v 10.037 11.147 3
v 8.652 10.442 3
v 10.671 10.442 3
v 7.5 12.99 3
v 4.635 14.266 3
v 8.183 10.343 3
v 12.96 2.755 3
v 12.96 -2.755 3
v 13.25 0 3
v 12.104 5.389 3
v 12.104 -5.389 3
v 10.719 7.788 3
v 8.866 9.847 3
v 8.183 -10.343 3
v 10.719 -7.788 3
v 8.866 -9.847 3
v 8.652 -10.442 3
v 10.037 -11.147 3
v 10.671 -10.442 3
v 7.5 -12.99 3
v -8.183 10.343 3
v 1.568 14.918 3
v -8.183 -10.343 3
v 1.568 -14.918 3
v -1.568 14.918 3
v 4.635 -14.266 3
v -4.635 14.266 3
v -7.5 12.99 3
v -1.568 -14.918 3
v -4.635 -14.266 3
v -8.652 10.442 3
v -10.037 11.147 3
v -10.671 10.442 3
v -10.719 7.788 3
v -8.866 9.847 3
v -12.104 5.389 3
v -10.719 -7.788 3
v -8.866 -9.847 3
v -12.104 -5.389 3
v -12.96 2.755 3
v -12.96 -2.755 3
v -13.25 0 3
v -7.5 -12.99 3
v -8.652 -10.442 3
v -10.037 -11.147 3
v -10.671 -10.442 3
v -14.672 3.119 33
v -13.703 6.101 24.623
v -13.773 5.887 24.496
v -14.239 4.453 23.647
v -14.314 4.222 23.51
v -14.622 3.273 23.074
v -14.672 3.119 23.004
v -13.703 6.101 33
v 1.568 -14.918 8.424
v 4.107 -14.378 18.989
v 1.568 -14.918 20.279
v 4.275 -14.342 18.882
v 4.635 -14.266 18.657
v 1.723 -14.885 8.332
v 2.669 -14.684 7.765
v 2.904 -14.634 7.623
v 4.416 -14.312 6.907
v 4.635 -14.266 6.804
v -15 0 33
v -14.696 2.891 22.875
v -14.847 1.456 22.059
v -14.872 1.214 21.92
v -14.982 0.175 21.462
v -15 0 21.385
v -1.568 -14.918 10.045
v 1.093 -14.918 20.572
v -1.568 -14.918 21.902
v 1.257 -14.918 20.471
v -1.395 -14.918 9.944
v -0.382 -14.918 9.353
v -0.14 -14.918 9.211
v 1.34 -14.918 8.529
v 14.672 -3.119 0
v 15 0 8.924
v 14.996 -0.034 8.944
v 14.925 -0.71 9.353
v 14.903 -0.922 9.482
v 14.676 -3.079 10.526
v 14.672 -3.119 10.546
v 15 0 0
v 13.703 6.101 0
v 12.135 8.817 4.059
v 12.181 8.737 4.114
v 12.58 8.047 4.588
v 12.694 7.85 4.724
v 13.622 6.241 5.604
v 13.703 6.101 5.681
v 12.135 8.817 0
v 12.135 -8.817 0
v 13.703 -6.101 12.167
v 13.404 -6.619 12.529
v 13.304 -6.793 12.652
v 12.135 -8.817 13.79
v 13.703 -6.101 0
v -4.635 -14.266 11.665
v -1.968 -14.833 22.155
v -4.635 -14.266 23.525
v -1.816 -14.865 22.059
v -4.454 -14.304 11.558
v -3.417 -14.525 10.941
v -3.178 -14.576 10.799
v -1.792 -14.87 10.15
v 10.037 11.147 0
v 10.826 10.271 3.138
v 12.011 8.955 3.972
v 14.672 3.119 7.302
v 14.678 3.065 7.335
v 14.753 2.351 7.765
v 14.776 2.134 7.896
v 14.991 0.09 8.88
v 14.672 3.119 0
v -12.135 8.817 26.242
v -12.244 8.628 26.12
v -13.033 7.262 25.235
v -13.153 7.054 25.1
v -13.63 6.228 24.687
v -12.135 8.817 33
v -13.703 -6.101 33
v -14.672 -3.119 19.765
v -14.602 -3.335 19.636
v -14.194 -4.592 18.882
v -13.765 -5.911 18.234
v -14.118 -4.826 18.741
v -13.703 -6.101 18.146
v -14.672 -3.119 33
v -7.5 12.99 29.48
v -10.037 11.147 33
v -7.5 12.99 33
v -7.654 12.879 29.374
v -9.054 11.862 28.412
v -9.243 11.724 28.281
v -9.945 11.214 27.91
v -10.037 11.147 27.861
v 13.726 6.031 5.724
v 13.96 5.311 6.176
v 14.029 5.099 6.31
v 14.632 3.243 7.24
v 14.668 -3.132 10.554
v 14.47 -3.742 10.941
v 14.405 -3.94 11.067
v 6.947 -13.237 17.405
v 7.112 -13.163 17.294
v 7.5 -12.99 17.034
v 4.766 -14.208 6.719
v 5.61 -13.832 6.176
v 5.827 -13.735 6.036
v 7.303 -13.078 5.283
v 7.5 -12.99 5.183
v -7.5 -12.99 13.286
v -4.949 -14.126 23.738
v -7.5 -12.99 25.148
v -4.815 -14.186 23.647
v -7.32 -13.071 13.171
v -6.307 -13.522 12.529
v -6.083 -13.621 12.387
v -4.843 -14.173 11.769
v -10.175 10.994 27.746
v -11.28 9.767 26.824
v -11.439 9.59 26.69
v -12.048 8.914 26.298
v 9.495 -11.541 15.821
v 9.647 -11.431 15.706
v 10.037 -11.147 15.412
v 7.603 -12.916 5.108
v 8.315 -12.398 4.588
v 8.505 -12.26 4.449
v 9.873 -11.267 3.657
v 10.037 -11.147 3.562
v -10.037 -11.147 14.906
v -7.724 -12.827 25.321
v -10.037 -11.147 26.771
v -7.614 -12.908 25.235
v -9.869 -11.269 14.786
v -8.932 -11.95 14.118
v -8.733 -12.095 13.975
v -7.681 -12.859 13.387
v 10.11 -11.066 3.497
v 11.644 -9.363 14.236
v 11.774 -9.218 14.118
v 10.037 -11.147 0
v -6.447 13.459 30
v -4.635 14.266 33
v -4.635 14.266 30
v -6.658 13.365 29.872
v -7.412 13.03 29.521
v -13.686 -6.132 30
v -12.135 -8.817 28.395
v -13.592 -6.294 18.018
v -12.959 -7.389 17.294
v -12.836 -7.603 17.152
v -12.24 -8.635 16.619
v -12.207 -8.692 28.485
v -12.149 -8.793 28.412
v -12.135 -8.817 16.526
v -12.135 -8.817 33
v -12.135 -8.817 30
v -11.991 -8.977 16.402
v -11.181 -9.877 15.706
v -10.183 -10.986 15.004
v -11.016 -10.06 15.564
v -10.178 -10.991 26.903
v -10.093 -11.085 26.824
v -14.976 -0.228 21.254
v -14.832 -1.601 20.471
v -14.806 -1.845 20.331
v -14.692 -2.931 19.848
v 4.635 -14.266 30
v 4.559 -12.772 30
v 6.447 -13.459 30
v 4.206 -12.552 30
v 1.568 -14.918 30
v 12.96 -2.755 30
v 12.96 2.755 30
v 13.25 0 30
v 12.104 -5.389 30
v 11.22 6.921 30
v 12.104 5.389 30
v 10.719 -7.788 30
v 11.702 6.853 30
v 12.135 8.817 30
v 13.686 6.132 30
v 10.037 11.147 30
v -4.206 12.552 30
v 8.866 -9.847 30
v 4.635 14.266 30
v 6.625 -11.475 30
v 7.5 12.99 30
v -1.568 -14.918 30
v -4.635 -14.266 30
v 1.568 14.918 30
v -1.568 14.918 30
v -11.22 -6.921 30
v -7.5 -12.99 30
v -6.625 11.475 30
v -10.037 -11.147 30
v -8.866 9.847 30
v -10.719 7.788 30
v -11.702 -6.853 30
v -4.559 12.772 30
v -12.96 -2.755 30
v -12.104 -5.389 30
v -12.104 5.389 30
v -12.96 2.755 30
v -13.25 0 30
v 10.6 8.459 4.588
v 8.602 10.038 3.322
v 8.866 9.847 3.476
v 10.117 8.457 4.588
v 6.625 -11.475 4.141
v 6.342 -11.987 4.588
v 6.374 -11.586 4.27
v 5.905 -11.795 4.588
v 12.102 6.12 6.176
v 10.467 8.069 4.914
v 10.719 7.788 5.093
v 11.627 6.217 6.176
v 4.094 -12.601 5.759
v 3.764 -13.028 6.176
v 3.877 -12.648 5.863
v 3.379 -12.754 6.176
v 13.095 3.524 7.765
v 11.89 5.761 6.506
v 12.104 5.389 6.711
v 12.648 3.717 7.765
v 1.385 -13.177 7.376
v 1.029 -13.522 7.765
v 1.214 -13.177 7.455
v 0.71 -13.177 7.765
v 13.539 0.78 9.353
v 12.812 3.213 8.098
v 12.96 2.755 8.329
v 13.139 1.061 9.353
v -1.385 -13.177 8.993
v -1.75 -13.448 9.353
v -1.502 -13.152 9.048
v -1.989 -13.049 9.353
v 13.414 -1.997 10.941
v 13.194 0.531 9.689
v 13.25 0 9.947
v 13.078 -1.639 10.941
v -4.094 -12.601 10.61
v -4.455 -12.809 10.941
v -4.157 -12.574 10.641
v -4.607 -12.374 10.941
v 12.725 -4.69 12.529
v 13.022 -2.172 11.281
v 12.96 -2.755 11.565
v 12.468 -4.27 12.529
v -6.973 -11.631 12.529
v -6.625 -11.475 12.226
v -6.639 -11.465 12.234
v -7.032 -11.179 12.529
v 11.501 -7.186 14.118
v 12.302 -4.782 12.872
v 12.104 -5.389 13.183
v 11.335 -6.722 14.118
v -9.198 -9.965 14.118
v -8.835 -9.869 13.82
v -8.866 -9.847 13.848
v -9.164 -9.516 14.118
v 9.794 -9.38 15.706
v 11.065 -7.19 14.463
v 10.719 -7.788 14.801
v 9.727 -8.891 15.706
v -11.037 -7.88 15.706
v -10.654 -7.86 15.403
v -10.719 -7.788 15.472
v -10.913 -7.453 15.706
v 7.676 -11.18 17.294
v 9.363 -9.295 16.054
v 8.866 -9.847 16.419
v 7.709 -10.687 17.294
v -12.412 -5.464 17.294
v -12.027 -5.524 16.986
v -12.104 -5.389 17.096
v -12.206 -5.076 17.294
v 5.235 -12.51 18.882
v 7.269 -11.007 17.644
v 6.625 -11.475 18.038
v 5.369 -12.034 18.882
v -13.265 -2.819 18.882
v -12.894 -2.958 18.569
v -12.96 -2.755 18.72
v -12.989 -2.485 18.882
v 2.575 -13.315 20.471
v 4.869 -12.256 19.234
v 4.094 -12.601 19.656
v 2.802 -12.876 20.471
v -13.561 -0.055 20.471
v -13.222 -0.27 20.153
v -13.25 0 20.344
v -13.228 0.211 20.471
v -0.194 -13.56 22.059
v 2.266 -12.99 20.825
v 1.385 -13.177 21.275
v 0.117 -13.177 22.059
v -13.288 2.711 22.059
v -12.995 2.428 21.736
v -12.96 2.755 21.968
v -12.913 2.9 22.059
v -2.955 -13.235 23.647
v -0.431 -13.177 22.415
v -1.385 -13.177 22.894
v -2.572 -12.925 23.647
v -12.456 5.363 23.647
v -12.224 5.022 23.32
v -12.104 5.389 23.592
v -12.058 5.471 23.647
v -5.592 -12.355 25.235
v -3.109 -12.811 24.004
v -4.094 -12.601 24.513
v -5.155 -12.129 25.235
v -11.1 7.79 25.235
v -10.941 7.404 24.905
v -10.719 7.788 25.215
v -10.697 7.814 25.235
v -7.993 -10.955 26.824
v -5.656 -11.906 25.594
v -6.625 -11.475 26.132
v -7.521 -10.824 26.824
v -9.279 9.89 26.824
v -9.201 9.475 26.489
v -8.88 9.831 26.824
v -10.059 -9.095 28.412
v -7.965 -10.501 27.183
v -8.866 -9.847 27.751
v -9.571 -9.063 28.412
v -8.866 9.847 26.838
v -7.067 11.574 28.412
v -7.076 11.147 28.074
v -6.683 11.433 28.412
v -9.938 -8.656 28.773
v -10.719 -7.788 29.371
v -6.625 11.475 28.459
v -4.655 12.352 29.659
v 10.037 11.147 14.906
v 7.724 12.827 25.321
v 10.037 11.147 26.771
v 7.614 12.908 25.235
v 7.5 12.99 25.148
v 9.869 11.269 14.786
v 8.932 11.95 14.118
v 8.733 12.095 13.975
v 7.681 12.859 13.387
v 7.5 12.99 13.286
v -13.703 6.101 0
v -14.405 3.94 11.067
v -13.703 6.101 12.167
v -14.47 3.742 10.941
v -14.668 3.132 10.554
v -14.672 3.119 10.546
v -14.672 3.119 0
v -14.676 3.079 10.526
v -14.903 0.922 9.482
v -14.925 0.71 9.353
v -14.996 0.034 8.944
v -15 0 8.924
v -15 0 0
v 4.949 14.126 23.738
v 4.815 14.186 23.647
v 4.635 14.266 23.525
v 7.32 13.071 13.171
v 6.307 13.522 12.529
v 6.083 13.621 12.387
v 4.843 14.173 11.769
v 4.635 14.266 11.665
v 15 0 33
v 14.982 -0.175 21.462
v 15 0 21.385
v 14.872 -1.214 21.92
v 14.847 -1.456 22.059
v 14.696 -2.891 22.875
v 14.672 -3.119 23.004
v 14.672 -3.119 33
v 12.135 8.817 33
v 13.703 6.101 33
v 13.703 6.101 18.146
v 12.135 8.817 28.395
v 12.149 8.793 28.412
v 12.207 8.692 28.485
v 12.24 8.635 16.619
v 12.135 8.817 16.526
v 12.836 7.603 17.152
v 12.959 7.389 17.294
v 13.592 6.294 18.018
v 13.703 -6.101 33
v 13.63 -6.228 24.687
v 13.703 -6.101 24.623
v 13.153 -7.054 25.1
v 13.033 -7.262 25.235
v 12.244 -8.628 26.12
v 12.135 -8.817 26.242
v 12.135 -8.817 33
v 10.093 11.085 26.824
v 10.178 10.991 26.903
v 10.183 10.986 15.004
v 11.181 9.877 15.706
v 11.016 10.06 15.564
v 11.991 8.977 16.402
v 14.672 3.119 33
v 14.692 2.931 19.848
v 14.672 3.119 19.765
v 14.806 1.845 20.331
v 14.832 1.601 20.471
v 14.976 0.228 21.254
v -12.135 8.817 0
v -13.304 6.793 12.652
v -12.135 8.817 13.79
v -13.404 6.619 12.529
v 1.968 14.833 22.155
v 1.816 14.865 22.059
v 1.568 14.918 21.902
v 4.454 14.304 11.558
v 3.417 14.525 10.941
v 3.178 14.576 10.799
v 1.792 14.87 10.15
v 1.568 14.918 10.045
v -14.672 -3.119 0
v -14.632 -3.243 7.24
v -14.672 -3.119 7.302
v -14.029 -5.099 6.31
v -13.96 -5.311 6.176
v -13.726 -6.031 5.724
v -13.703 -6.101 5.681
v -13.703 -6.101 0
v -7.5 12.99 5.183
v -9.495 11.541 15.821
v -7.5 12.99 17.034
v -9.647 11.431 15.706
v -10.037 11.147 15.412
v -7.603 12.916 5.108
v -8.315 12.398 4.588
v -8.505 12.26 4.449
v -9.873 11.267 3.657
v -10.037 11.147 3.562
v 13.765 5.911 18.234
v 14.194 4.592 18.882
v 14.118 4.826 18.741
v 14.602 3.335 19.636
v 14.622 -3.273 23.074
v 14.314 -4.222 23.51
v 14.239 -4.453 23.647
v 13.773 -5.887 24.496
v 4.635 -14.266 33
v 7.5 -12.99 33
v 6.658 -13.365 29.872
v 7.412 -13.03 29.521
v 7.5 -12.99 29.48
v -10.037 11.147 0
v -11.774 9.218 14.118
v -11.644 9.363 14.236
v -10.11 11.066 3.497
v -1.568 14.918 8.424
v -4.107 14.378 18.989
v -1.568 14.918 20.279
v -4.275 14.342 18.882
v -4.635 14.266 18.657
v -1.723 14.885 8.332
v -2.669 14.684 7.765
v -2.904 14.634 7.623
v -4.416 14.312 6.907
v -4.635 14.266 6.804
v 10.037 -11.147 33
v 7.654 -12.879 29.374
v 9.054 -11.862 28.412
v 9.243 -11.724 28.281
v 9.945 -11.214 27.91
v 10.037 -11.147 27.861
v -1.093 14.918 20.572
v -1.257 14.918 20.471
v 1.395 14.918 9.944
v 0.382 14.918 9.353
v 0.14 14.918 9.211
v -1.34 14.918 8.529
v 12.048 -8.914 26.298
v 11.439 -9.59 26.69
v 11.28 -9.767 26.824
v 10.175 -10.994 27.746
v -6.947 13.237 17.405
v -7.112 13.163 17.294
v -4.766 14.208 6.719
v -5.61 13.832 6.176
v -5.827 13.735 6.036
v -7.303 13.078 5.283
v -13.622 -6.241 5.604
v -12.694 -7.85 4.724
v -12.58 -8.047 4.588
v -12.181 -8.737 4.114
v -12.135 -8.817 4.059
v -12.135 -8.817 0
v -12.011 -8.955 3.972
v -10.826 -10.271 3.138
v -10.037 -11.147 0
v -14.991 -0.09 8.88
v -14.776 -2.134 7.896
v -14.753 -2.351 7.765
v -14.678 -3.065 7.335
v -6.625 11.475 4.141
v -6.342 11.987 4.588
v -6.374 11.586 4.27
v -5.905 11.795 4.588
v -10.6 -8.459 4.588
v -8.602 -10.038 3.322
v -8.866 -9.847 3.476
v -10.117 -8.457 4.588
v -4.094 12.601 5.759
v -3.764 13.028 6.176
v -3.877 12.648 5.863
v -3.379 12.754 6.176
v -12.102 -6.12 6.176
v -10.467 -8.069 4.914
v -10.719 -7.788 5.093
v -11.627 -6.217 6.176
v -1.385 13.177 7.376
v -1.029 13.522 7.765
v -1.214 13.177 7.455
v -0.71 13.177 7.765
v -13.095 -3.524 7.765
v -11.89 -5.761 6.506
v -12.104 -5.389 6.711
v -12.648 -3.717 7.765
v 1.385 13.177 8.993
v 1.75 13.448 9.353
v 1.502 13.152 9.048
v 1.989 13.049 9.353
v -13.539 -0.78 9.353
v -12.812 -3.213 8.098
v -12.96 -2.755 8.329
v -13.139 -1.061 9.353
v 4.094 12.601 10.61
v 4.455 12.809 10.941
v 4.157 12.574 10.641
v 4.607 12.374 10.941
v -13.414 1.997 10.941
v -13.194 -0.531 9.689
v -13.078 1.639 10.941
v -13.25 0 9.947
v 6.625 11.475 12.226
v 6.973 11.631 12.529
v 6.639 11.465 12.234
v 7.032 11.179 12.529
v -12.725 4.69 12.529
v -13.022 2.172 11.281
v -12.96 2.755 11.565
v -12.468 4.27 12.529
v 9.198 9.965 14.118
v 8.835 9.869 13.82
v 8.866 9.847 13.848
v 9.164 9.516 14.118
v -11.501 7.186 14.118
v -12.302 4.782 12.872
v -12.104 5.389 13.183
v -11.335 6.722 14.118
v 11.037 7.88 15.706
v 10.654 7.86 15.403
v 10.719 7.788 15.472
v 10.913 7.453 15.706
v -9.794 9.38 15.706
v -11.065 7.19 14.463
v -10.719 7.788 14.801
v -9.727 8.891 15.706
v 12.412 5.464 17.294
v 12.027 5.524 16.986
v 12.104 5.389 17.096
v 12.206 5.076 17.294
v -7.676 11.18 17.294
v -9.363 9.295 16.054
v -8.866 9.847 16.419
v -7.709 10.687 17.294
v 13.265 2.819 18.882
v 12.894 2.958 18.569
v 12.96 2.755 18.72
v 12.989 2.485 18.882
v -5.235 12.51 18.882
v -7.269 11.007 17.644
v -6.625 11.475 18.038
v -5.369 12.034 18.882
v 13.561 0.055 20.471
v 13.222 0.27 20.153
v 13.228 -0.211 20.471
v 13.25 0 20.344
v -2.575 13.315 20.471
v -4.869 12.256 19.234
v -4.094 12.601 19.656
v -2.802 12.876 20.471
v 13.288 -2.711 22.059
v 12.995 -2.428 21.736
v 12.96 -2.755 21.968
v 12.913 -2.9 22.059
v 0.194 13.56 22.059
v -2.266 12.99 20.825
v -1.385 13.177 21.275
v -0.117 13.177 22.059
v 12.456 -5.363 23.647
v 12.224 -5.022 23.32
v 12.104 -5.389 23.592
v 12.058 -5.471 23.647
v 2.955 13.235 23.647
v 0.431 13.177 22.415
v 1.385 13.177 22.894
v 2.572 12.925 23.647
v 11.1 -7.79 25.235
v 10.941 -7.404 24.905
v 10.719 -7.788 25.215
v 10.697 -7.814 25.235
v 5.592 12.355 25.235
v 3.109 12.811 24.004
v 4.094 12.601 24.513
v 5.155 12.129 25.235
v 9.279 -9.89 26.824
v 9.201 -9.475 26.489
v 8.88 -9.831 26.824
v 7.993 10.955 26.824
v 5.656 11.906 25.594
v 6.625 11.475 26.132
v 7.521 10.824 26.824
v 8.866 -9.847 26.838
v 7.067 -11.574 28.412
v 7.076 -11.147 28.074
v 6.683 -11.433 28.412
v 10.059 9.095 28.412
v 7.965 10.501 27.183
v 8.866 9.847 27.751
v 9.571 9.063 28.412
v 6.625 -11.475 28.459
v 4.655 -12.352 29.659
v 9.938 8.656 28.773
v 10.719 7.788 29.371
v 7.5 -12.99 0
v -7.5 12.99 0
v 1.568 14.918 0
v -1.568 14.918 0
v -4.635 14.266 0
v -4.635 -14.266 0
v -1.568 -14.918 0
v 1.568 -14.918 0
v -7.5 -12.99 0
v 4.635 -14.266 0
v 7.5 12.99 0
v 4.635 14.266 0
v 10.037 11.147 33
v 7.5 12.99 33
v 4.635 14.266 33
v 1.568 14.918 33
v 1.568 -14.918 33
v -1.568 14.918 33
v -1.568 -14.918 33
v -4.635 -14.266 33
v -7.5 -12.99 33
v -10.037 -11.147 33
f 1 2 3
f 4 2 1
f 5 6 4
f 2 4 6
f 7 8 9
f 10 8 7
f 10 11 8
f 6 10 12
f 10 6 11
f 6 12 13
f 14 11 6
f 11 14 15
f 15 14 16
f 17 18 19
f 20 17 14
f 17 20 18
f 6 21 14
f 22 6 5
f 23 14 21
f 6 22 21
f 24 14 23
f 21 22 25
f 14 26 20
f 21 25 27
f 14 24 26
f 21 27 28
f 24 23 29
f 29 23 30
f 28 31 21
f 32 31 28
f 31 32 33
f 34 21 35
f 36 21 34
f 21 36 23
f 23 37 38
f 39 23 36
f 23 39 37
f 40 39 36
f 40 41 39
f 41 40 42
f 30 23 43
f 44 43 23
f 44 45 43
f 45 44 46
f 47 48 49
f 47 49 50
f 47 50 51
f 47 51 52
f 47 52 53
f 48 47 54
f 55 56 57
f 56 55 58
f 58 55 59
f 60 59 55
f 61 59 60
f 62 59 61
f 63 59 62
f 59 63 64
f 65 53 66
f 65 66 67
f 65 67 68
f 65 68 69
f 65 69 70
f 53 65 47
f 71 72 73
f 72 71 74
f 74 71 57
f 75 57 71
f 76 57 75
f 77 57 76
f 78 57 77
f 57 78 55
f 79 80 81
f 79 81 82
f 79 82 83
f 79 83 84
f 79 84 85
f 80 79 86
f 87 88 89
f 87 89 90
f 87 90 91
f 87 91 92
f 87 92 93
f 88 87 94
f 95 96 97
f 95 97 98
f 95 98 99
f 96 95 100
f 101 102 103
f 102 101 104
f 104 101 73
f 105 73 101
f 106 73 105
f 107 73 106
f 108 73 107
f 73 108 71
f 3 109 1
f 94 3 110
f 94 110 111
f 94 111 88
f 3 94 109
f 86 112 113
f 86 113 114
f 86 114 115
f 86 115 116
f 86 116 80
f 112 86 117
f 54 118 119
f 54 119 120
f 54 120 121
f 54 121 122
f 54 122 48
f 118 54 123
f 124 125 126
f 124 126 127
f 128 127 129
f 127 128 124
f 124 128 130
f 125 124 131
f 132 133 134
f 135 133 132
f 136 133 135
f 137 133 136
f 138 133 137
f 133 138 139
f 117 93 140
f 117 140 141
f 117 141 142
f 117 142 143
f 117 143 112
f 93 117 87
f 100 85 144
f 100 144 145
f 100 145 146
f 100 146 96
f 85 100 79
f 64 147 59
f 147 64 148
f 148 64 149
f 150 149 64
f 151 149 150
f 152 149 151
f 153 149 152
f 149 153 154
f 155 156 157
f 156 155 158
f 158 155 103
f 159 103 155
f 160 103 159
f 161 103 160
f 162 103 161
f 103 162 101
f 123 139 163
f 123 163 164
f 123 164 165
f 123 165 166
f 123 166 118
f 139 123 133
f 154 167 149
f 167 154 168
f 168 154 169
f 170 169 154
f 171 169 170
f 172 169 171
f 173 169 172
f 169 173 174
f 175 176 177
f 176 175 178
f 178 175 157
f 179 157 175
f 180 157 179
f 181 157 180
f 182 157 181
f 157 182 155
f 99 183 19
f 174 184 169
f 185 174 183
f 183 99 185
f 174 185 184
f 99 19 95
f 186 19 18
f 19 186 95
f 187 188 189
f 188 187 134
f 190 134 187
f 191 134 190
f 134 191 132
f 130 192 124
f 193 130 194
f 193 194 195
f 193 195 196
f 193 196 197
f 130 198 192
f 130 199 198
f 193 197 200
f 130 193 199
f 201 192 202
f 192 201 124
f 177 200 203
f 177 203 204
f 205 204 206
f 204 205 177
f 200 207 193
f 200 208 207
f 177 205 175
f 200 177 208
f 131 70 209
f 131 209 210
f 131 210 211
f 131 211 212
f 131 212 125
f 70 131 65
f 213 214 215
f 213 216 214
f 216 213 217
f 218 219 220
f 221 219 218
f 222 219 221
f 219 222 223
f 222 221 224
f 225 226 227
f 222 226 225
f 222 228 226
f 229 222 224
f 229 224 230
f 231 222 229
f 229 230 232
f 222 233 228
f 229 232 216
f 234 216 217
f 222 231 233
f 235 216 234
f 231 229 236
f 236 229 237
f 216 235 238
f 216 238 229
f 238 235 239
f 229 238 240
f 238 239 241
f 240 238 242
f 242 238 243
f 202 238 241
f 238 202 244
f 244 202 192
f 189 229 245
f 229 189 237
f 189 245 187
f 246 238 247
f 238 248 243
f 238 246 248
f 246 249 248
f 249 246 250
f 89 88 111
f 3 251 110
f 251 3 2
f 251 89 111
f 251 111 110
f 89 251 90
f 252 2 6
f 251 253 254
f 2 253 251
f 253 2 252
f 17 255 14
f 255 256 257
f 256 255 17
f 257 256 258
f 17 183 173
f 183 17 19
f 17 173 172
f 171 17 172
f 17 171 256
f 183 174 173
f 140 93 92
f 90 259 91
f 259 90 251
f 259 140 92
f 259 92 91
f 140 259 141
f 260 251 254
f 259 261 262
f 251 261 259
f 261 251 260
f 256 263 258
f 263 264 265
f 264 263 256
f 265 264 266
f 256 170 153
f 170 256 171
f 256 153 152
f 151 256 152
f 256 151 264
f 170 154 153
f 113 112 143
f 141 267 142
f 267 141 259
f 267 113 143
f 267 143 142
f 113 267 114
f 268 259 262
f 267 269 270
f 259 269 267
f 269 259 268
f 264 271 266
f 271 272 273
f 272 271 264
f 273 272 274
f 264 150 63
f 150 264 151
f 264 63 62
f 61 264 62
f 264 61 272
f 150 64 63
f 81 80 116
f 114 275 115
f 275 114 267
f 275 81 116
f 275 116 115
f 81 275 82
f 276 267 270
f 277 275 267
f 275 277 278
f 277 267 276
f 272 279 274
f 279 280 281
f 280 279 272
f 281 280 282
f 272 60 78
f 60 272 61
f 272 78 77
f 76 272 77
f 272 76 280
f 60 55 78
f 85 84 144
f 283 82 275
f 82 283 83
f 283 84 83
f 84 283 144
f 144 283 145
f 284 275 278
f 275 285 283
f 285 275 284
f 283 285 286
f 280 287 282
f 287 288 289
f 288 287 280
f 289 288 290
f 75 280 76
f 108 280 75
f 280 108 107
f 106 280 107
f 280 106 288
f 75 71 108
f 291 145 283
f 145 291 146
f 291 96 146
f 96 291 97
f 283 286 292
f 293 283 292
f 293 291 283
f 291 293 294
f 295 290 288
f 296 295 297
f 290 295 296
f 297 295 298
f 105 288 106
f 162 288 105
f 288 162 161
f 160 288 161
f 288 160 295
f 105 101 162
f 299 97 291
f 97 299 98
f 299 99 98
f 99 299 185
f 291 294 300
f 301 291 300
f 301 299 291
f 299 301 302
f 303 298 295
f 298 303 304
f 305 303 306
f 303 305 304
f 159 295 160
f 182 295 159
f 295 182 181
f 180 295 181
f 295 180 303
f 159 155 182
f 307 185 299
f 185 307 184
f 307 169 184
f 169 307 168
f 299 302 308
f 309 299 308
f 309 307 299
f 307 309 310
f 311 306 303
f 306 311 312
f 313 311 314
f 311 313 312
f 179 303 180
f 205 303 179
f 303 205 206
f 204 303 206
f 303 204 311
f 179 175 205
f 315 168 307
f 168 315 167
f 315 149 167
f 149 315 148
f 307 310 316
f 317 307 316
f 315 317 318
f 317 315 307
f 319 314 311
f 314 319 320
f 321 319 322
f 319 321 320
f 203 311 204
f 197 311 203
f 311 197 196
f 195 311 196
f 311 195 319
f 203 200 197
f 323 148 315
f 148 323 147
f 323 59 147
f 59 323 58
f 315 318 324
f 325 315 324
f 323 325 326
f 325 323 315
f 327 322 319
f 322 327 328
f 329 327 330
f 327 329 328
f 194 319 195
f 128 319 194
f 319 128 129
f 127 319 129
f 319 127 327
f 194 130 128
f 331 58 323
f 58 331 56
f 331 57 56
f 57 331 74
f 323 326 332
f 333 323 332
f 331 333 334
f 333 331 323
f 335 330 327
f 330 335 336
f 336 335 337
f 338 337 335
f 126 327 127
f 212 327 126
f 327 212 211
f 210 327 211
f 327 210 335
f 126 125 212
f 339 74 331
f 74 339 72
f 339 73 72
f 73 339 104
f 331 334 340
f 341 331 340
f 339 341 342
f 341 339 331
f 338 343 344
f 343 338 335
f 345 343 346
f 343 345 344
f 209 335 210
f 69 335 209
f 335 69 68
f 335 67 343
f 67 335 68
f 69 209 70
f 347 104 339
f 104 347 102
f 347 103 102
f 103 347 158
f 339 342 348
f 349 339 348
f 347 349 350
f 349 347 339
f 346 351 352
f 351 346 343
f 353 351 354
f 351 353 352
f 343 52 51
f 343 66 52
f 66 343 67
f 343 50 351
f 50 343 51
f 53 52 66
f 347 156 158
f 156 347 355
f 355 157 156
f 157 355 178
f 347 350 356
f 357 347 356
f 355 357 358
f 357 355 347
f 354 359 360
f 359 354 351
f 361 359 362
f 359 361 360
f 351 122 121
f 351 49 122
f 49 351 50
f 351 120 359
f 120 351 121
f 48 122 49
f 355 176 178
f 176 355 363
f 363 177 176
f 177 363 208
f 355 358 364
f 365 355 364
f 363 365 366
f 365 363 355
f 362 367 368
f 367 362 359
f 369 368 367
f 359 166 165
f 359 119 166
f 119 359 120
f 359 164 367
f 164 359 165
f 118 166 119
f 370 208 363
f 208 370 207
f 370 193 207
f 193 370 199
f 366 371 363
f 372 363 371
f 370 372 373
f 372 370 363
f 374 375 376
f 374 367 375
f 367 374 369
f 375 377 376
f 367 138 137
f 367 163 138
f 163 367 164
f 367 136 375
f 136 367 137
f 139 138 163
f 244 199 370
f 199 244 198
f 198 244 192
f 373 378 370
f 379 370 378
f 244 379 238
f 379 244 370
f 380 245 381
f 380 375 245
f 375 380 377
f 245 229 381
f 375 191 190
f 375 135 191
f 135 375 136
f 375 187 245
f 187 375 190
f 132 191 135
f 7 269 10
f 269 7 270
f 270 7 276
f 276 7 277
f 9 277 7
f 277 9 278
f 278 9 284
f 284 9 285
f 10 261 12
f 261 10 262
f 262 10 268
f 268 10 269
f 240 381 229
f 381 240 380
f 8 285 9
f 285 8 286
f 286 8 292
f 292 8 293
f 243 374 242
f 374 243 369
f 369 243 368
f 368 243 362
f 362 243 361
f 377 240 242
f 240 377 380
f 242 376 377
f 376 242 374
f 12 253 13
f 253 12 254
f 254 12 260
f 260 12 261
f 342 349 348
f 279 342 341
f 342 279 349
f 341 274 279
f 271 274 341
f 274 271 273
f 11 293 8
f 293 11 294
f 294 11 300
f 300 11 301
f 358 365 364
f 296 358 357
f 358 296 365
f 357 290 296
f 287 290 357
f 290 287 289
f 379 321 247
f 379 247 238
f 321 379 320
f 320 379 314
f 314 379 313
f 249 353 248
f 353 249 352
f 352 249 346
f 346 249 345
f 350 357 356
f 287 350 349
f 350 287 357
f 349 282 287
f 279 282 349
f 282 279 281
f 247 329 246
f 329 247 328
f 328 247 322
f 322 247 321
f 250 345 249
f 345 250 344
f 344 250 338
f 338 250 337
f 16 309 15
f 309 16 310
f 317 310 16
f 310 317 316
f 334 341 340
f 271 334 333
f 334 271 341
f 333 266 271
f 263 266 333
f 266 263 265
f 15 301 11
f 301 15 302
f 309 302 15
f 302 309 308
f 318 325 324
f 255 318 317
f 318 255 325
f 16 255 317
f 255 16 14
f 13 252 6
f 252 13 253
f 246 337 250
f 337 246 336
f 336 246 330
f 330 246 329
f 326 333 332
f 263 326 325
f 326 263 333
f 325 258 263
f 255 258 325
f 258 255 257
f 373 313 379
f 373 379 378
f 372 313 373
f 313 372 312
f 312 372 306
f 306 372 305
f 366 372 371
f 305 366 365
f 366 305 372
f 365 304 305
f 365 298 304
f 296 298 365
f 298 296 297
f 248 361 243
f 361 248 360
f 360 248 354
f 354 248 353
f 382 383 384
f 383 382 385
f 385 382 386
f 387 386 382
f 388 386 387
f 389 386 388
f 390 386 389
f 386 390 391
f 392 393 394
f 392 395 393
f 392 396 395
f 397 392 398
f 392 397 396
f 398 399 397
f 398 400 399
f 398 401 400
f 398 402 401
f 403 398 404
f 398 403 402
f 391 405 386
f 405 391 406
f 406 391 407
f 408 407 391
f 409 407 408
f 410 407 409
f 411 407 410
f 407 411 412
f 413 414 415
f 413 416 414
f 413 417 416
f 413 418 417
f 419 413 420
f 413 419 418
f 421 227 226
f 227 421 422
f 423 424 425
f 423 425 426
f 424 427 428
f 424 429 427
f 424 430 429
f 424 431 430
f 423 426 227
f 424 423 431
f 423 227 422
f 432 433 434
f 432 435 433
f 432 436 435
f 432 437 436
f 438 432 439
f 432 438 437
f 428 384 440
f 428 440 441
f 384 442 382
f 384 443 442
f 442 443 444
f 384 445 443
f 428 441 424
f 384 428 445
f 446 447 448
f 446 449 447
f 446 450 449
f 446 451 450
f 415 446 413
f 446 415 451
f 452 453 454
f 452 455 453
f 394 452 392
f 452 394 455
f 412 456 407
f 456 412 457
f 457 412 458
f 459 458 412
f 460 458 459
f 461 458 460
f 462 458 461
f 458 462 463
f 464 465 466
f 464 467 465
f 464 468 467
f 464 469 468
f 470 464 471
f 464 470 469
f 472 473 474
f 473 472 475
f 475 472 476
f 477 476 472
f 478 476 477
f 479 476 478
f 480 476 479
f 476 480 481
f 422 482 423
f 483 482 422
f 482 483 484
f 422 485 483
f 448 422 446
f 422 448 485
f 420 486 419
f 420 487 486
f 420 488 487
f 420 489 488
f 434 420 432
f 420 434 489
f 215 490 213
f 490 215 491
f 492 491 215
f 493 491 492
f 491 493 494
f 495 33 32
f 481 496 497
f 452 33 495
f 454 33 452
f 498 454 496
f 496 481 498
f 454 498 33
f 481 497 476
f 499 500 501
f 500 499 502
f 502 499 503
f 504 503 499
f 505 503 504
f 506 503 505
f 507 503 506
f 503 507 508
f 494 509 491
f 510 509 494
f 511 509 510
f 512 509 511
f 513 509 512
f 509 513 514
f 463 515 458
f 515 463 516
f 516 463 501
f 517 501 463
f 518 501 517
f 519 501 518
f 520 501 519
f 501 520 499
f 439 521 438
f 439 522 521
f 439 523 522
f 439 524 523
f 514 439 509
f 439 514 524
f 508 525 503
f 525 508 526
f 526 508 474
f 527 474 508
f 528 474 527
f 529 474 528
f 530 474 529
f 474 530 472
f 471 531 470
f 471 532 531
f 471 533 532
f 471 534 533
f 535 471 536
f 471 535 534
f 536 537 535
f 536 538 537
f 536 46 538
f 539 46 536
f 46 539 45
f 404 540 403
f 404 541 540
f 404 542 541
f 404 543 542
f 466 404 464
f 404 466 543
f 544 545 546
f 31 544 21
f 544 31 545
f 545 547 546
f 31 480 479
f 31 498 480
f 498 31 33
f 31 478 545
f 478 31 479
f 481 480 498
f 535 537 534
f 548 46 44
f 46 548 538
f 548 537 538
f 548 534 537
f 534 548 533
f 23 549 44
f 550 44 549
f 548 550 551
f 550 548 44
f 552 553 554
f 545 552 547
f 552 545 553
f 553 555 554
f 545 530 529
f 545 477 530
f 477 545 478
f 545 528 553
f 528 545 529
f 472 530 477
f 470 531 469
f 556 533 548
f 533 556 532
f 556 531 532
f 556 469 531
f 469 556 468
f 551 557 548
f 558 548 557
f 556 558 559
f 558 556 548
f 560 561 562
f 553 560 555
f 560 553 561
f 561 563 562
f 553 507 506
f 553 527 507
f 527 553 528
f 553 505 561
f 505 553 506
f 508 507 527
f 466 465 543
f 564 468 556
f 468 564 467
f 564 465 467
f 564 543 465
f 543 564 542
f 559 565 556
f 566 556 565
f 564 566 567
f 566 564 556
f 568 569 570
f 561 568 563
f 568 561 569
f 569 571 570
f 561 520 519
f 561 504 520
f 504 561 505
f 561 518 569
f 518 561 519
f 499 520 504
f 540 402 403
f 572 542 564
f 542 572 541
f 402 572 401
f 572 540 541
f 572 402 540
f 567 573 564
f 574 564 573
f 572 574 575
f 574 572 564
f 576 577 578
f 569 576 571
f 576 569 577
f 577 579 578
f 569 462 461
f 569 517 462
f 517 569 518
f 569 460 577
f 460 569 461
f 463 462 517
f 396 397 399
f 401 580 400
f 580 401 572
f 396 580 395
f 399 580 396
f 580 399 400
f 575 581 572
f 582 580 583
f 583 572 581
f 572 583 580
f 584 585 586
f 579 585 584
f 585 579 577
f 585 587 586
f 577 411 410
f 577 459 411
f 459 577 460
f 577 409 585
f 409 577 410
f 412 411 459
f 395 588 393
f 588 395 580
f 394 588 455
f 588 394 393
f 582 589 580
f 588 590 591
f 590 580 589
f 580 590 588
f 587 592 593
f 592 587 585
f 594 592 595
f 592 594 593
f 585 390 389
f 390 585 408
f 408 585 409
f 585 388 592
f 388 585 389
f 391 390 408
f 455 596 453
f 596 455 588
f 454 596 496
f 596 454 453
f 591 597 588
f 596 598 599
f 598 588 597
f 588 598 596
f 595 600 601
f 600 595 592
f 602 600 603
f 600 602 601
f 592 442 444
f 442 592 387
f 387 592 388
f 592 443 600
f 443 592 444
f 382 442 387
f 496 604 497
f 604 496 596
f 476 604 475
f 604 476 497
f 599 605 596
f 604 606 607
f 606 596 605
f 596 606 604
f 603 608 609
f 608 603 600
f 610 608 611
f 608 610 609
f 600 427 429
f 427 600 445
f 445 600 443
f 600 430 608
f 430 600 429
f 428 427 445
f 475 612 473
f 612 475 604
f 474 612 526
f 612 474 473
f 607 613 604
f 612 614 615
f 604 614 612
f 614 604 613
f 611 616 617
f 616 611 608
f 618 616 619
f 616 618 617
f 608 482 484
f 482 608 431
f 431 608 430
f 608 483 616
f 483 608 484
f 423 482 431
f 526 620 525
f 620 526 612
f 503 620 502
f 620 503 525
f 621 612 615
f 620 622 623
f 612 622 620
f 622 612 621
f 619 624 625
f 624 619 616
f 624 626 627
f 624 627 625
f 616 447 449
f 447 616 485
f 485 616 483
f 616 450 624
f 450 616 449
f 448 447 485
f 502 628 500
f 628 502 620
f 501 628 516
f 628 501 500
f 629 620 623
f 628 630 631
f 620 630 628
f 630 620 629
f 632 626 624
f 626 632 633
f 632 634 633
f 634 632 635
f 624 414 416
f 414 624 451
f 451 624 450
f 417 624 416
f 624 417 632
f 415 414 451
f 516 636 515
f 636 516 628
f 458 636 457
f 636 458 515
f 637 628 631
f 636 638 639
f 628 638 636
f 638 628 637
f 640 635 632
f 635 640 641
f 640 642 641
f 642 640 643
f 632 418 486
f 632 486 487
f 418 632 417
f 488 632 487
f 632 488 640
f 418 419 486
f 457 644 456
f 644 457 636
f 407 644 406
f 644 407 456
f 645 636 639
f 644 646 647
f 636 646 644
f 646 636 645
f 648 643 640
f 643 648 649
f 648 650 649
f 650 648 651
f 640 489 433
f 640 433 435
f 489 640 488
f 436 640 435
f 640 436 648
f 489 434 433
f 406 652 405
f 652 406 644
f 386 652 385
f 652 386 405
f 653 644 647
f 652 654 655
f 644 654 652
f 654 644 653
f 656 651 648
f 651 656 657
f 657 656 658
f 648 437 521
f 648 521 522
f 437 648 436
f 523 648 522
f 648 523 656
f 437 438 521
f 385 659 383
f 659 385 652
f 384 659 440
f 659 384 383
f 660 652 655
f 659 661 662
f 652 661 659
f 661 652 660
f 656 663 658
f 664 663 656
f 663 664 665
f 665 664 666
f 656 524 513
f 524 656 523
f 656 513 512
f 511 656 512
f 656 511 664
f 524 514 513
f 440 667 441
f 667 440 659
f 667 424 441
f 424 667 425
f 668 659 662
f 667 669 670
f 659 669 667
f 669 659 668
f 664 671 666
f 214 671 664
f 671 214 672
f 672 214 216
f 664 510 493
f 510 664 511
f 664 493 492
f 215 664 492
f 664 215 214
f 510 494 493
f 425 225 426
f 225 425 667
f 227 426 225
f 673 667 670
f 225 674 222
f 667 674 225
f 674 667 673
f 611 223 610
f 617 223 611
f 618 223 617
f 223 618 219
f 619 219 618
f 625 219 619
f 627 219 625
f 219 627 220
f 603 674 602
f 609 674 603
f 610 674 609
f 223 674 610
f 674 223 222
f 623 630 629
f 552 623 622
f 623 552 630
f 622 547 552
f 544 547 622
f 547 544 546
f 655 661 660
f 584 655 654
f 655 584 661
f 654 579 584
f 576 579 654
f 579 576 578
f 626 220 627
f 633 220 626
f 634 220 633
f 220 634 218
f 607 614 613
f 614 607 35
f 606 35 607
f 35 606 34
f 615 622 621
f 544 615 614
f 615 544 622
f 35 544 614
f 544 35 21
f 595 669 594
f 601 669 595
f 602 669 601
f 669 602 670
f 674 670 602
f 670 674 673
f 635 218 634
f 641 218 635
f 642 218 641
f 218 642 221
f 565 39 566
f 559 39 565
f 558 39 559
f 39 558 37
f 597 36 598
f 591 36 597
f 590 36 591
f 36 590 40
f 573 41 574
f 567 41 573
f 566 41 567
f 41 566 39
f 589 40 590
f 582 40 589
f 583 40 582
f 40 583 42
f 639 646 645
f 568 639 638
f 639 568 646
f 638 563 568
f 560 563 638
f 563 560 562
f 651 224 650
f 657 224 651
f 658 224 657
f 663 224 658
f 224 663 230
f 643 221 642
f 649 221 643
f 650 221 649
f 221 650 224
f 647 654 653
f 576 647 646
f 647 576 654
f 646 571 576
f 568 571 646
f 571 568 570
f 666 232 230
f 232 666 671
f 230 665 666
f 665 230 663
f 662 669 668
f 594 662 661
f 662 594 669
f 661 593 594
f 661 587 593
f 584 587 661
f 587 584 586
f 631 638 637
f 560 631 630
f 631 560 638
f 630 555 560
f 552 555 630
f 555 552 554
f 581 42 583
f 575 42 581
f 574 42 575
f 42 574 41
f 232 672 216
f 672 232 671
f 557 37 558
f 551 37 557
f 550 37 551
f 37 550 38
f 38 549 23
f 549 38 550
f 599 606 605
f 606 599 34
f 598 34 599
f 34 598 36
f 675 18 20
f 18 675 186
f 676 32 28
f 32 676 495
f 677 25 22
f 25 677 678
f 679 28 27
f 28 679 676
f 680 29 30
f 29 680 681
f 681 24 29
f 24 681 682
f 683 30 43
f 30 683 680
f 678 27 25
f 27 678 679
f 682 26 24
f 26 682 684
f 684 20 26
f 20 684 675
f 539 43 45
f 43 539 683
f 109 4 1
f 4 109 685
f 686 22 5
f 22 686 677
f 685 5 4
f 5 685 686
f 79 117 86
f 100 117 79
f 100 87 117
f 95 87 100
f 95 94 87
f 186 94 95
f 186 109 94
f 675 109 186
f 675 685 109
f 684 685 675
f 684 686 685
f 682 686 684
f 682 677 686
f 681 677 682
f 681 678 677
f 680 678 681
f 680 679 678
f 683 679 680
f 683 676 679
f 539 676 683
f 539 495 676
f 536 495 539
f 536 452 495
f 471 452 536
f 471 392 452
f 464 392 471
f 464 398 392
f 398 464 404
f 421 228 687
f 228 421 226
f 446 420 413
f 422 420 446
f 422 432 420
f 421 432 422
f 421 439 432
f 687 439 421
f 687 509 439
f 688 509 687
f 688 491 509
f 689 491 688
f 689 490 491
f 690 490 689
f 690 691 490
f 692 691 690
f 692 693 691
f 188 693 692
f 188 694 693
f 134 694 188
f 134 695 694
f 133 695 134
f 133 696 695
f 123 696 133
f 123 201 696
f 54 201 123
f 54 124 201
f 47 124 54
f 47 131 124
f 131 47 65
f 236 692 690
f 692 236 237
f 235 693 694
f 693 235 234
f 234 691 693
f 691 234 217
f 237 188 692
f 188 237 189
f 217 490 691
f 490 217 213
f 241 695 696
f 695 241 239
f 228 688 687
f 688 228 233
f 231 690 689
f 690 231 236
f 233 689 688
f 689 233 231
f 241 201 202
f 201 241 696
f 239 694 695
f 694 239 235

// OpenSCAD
//Pitch of the spiral
pitch = 2;

//Radius of the cylinder
radius = 15;

//Height of the cylinder
height = 30;

//Spiral Thickness
sp = 1.75;

thickness = radius*.7;

cylinder(h=height/10,r=radius,c=true);
translate([0,0,height]){
    cylinder(h=height/10,r=radius,c=true);
}

translate([0,0,height/10]){
    difference(){
        //Create The spiral
        linear_extrude(height*(9/10), center = false, convexity = 10, twist = pitch*100)
        translate([radius-thickness/2, 0, 0]){
        circle(r = thickness);}
        //Cut out the inside
        cylinder(h=height,r=radius-sp,c=false);
        //Cut out the outside
        difference(){
            cylinder(h=height,r=2*radius,c=false);
            cylinder(h=height,r=radius,c=false);
        }
    }
        
    
}

translate([0,0,height/10]){
    difference(){
        //Create The spiral
        linear_extrude(height*(9/10), center = false, convexity = 10, twist = pitch*100)
        translate([-(radius-thickness/2), 0, 0]){
        circle(r = thickness);}
        //Cut out the inside
        cylinder(h=height,r=radius-sp,c=false);
        //Cut out the outside
        difference(){
            cylinder(h=height,r=2*radius,c=false);
            cylinder(h=height,r=radius,c=false);
        }
    }
        
    
}
    
